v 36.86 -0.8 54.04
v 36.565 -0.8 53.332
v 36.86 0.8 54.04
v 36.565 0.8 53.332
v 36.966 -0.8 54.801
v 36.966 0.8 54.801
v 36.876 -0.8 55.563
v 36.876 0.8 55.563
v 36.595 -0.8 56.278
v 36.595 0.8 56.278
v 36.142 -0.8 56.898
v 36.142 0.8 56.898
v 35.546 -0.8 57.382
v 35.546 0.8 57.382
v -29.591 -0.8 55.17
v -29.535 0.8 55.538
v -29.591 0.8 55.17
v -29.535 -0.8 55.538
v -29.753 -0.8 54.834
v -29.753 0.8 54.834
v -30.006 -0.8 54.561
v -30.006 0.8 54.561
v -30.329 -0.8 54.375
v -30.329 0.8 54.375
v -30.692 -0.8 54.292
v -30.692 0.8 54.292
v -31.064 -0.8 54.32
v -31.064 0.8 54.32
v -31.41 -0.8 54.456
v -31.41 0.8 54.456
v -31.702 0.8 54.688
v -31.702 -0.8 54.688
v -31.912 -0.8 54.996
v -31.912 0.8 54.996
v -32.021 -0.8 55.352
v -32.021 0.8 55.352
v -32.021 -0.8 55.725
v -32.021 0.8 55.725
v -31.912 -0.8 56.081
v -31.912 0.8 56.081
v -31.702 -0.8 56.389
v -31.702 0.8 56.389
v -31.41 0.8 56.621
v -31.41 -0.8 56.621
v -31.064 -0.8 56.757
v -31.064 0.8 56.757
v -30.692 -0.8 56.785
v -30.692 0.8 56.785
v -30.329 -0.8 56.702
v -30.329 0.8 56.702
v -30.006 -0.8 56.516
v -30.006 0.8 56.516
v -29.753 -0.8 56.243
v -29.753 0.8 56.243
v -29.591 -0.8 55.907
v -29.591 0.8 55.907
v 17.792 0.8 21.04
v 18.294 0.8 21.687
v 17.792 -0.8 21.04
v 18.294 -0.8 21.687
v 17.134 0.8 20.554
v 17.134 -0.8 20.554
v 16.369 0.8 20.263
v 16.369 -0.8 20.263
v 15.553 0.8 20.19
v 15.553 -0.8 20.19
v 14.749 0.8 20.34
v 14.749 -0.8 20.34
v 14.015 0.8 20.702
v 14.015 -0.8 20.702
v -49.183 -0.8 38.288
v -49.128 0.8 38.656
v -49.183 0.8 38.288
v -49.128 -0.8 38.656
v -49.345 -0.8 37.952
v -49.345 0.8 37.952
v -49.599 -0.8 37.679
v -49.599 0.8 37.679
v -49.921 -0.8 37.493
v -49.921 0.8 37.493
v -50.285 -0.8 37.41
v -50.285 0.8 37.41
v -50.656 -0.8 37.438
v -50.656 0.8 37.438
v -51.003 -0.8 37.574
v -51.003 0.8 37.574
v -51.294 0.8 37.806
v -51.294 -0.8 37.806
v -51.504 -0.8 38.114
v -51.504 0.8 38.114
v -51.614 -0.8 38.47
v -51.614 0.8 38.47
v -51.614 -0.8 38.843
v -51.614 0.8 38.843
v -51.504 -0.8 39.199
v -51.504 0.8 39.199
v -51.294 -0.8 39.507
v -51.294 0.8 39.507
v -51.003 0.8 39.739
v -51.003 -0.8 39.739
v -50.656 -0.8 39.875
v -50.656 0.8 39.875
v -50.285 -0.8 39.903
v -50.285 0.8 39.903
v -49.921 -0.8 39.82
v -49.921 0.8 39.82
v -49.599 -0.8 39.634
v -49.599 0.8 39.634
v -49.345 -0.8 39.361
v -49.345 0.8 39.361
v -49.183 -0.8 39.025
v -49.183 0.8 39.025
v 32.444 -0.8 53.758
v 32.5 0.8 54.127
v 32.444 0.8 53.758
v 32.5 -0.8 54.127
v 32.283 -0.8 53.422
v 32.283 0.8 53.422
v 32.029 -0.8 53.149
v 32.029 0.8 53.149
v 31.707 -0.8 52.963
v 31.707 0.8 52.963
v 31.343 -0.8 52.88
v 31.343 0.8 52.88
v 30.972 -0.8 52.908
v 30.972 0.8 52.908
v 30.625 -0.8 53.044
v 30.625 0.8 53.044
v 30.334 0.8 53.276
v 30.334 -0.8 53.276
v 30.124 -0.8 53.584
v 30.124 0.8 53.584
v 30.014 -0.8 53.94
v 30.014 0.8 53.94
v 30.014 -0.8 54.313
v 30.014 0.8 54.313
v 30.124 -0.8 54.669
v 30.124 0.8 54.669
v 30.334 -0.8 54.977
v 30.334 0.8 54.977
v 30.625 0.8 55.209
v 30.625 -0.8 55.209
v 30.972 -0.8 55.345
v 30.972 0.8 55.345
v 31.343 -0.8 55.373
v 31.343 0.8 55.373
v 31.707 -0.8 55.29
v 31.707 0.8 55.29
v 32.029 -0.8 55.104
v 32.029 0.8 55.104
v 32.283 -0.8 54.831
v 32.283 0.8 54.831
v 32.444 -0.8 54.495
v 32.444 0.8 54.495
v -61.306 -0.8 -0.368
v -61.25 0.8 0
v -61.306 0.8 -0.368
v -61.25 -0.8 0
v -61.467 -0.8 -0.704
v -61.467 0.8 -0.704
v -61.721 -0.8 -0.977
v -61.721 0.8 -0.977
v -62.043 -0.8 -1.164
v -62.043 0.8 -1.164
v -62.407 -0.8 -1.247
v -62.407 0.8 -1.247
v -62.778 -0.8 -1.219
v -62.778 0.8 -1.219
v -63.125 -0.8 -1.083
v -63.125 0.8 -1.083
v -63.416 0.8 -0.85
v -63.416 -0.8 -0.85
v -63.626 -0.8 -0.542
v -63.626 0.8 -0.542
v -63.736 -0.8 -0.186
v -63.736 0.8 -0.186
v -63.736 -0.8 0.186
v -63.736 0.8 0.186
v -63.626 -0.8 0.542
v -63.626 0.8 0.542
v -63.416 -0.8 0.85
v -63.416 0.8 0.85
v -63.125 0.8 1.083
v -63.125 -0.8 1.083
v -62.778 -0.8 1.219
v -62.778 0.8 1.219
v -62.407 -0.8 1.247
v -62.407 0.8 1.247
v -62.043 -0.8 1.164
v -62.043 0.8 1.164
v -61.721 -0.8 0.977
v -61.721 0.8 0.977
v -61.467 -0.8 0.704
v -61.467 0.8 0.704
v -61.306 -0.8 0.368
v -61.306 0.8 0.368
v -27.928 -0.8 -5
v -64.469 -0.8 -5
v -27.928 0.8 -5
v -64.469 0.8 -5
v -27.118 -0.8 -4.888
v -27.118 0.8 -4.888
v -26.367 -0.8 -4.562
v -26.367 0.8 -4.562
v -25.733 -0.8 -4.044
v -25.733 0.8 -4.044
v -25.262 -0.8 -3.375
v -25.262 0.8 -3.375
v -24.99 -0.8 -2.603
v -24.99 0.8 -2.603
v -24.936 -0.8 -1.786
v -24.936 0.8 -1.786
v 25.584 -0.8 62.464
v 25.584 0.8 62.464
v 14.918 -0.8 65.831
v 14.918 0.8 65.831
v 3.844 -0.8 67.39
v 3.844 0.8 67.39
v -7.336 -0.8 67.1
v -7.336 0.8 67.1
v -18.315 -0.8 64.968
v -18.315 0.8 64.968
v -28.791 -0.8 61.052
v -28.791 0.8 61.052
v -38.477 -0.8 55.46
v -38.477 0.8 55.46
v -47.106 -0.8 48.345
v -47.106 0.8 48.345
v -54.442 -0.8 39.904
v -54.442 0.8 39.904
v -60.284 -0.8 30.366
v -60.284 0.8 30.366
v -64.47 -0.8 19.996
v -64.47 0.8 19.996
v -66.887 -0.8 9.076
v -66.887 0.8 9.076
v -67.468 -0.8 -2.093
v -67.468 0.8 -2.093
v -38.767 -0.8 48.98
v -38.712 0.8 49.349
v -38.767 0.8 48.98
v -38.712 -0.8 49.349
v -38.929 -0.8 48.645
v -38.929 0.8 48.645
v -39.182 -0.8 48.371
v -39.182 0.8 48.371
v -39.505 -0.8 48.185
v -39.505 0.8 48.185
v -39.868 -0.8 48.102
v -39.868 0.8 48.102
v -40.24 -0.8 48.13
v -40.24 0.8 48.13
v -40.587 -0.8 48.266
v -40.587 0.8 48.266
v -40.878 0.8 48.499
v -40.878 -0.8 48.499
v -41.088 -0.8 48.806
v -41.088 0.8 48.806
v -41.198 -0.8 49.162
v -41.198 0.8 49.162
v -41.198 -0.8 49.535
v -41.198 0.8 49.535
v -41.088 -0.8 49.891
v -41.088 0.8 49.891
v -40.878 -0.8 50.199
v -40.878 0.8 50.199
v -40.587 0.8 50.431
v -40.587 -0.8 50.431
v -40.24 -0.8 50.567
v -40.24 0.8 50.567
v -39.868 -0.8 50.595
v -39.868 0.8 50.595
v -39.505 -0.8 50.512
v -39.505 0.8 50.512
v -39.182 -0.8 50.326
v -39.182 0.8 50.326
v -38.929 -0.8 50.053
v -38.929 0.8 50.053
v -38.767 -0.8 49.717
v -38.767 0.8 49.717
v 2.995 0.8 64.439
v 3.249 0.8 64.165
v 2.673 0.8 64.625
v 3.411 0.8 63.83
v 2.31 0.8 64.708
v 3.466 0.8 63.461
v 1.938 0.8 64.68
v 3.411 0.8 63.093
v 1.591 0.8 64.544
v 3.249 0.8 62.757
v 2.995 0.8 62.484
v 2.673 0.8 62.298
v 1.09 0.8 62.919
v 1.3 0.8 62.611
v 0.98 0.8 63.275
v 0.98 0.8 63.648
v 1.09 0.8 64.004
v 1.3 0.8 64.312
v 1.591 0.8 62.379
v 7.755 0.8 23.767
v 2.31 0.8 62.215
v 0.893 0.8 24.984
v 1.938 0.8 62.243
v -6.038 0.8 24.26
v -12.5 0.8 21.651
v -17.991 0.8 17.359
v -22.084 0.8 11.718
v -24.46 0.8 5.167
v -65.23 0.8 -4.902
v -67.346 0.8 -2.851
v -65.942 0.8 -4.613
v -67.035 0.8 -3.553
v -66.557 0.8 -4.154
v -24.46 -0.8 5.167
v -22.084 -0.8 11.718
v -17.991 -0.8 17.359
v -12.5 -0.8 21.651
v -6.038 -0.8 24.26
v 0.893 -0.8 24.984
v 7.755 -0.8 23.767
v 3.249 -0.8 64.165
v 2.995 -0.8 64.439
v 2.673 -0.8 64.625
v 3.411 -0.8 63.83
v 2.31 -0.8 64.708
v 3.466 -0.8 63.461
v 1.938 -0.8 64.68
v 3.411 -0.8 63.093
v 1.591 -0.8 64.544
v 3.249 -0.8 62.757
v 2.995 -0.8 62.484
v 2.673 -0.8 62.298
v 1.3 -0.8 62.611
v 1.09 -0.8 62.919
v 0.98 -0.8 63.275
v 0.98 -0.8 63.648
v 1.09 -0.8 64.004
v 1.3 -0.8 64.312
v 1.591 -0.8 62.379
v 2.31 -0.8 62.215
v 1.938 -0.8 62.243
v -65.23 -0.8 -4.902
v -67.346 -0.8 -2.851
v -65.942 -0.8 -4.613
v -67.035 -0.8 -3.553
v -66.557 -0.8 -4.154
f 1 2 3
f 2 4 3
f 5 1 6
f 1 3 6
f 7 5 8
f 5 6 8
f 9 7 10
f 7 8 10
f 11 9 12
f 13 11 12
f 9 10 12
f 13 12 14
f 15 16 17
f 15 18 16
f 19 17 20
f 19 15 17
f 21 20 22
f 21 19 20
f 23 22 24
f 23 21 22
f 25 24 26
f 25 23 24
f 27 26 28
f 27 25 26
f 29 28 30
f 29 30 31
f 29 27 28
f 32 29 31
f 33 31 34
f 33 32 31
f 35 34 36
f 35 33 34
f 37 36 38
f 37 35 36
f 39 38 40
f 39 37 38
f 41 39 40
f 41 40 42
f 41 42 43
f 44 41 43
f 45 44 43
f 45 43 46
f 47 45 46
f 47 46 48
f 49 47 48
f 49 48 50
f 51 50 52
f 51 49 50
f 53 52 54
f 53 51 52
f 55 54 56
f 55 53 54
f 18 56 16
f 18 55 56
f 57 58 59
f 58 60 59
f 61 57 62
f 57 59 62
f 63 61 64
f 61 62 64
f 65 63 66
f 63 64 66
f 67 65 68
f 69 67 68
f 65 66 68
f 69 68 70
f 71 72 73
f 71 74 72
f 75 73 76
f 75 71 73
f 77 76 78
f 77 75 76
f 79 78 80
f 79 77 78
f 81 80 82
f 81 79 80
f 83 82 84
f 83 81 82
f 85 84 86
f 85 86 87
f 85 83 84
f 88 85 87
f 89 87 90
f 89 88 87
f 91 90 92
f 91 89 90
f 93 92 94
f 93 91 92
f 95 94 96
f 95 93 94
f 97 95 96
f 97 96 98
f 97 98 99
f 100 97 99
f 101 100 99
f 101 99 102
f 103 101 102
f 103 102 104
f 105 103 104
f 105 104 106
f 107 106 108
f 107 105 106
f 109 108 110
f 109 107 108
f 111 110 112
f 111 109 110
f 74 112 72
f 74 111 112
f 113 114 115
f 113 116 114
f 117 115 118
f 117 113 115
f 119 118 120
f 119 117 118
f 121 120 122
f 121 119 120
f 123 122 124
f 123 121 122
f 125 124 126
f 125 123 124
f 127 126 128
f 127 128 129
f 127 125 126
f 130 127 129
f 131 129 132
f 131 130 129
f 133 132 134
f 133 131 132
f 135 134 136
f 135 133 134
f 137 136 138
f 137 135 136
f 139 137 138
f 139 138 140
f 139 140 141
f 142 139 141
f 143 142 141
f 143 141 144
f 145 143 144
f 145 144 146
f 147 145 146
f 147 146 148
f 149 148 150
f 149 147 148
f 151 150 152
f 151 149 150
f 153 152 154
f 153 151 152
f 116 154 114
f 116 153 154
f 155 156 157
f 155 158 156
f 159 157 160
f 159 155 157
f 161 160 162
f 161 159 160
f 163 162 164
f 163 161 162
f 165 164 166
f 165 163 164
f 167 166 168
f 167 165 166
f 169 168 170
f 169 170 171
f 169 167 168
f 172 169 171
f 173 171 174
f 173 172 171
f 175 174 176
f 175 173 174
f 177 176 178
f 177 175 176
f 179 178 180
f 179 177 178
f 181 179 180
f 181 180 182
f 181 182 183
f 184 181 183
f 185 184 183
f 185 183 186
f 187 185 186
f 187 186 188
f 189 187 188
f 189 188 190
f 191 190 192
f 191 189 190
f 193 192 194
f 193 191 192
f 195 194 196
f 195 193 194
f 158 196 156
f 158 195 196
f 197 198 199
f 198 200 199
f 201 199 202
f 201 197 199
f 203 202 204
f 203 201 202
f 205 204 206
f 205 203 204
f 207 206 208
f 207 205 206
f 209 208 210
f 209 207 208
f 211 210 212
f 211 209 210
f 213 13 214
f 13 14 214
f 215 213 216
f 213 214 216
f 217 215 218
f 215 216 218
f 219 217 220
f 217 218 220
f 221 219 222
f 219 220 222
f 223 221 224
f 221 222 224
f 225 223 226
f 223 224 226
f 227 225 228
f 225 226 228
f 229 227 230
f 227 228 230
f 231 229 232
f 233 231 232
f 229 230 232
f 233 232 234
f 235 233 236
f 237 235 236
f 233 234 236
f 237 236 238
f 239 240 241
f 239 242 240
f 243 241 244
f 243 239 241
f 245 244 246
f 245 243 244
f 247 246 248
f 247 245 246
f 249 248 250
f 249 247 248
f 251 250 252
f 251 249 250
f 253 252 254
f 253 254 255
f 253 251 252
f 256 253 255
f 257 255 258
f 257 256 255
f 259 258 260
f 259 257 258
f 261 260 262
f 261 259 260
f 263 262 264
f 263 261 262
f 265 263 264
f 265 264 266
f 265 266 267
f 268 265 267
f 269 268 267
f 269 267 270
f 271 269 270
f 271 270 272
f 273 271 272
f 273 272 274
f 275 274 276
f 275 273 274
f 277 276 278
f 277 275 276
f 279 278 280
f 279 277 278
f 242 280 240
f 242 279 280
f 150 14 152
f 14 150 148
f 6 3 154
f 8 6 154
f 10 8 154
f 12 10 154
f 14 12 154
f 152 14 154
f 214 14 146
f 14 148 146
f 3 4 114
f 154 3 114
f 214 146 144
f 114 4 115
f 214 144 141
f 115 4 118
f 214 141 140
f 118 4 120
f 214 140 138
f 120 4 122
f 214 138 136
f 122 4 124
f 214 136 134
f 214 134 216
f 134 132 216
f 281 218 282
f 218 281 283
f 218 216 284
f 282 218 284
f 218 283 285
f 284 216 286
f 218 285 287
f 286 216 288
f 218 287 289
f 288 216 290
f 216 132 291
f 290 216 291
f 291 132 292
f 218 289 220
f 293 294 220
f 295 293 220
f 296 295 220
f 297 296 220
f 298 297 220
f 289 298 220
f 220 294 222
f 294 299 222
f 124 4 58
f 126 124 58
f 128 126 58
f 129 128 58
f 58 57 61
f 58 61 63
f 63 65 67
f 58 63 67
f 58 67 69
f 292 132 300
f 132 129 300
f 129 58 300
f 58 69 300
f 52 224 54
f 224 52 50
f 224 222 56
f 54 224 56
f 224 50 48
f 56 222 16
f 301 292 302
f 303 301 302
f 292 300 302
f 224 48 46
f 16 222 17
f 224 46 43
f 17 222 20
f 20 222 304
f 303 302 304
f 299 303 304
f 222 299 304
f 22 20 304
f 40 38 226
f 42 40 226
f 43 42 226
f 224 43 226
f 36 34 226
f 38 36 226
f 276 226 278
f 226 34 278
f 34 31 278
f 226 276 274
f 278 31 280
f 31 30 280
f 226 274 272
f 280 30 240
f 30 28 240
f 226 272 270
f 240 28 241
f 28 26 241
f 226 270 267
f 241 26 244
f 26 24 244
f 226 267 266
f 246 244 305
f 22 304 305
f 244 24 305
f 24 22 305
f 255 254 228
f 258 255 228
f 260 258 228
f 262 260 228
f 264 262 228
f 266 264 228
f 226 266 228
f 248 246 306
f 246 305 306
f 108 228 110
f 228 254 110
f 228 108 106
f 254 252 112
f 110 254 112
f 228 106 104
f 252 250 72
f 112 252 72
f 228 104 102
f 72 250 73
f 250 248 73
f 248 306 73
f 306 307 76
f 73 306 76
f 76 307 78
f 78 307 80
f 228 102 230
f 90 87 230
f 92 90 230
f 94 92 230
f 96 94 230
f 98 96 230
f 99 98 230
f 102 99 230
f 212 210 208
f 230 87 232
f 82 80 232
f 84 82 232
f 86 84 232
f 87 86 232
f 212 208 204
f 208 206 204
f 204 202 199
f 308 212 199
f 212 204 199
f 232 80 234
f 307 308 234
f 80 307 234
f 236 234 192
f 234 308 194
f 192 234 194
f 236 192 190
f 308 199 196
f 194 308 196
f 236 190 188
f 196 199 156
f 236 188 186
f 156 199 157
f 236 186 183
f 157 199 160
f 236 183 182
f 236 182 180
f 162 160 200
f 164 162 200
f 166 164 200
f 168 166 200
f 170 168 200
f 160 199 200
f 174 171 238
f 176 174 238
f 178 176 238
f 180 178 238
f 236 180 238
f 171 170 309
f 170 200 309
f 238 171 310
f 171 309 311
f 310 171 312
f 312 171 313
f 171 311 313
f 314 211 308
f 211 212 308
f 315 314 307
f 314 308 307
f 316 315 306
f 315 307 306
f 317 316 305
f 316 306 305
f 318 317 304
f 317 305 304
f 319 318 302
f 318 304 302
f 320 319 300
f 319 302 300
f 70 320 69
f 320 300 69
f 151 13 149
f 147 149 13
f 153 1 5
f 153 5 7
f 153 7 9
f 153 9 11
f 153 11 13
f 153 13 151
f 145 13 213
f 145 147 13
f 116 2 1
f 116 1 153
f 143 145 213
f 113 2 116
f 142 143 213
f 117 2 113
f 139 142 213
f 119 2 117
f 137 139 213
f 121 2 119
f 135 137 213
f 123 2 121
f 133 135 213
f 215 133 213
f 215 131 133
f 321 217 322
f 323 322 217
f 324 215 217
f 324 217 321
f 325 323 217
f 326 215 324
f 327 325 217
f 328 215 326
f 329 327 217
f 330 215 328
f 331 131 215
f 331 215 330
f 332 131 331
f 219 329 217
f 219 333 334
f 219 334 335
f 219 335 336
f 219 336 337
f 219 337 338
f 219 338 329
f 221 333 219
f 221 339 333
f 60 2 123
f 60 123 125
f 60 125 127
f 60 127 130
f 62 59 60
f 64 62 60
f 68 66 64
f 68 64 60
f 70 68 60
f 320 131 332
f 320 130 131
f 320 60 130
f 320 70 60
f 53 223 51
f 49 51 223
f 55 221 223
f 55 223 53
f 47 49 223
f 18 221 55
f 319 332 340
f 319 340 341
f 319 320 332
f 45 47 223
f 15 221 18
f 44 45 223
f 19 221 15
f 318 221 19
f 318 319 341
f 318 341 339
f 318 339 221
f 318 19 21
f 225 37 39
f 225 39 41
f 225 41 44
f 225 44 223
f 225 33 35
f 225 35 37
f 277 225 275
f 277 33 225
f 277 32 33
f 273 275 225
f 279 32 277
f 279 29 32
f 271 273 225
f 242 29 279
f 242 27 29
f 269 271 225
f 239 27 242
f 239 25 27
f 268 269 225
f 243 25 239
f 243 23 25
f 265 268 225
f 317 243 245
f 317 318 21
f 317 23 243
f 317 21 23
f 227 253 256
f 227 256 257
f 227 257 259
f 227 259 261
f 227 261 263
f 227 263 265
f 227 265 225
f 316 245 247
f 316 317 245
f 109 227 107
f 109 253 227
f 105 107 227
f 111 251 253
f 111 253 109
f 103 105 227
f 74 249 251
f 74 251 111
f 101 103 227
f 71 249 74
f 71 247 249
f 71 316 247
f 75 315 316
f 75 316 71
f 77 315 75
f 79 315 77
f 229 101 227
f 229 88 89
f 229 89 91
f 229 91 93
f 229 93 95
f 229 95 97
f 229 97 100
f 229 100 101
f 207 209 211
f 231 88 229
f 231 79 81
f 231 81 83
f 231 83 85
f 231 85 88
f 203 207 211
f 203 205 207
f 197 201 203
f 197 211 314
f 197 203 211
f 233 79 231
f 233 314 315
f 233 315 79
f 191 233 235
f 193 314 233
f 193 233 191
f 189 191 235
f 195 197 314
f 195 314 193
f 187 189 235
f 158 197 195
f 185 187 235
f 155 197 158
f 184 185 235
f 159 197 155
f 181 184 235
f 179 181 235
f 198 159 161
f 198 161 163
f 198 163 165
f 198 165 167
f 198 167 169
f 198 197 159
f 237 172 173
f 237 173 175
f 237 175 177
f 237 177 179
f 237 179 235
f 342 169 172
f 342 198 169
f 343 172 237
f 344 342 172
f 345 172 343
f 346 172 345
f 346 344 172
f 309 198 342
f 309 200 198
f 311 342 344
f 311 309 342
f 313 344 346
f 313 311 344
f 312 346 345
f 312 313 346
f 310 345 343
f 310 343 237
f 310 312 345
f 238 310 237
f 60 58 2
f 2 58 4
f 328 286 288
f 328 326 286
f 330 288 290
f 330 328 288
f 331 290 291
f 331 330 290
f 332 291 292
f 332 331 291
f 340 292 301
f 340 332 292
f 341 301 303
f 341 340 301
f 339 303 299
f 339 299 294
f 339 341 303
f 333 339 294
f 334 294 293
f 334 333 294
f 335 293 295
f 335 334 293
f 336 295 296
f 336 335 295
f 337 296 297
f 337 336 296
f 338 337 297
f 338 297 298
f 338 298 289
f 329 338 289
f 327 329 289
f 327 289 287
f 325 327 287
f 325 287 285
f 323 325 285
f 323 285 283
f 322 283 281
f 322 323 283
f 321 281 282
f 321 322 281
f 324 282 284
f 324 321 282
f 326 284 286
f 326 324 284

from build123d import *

# Parameters (mm, degrees)
SKETCH1_R           = 1.25
BOSS_EXTRUDE1_DEPTH = 0.8
FILLET1_R           = 3


with BuildPart() as part:
    # Sketch1 → Boss-Extrude1 (new body, symmetric)
    with BuildSketch(Plane(origin=(0, 0, 0), x_dir=(1, 0, 0), z_dir=(0, 1, 0))):
        with BuildLine():
            Line((-67.314560089, 5), (-24.494897428, 5))
            ThreePointArc((-24.494897428, 5), (-12.5, -21.650635095), (16.577575733, -18.713203436))
            Line((16.577575733, -18.713203436), (37.987407064, -55.796119082))
            ThreePointArc((37.987407064, -55.796119082), (-33.75, -58.456714755), (-67.314560089, 5))
        make_face()
        with Locations((-62.5, 0)):
            Circle(SKETCH1_R, mode=Mode.SUBTRACT)
        with Locations((31.25, -54.126587737)):
            Circle(SKETCH1_R, mode=Mode.SUBTRACT)
        with Locations((2.216118041, -63.461317516)):
            Circle(SKETCH1_R, mode=Mode.SUBTRACT)
        with Locations((-30.785410886, -55.538351403)):
            Circle(SKETCH1_R, mode=Mode.SUBTRACT)
        with Locations((-39.961844832, -49.348768553)):
            Circle(SKETCH1_R, mode=Mode.SUBTRACT)
        with Locations((-50.377937108, -38.656350742)):
            Circle(SKETCH1_R, mode=Mode.SUBTRACT)
    extrude(amount=BOSS_EXTRUDE1_DEPTH, both=True)

    # Fillet1
    fillet1_edges = [part.edges().sort_by_distance(p)[0] for p in [
        (-67.314560089, 0, -5),
        (-24.494897428, 0, -5),
        (16.577575733, 0, 18.713203436),
        (37.987407064, 0, 55.796119082),
    ]]
    fillet(fillet1_edges, radius=FILLET1_R)


solid = part.part
